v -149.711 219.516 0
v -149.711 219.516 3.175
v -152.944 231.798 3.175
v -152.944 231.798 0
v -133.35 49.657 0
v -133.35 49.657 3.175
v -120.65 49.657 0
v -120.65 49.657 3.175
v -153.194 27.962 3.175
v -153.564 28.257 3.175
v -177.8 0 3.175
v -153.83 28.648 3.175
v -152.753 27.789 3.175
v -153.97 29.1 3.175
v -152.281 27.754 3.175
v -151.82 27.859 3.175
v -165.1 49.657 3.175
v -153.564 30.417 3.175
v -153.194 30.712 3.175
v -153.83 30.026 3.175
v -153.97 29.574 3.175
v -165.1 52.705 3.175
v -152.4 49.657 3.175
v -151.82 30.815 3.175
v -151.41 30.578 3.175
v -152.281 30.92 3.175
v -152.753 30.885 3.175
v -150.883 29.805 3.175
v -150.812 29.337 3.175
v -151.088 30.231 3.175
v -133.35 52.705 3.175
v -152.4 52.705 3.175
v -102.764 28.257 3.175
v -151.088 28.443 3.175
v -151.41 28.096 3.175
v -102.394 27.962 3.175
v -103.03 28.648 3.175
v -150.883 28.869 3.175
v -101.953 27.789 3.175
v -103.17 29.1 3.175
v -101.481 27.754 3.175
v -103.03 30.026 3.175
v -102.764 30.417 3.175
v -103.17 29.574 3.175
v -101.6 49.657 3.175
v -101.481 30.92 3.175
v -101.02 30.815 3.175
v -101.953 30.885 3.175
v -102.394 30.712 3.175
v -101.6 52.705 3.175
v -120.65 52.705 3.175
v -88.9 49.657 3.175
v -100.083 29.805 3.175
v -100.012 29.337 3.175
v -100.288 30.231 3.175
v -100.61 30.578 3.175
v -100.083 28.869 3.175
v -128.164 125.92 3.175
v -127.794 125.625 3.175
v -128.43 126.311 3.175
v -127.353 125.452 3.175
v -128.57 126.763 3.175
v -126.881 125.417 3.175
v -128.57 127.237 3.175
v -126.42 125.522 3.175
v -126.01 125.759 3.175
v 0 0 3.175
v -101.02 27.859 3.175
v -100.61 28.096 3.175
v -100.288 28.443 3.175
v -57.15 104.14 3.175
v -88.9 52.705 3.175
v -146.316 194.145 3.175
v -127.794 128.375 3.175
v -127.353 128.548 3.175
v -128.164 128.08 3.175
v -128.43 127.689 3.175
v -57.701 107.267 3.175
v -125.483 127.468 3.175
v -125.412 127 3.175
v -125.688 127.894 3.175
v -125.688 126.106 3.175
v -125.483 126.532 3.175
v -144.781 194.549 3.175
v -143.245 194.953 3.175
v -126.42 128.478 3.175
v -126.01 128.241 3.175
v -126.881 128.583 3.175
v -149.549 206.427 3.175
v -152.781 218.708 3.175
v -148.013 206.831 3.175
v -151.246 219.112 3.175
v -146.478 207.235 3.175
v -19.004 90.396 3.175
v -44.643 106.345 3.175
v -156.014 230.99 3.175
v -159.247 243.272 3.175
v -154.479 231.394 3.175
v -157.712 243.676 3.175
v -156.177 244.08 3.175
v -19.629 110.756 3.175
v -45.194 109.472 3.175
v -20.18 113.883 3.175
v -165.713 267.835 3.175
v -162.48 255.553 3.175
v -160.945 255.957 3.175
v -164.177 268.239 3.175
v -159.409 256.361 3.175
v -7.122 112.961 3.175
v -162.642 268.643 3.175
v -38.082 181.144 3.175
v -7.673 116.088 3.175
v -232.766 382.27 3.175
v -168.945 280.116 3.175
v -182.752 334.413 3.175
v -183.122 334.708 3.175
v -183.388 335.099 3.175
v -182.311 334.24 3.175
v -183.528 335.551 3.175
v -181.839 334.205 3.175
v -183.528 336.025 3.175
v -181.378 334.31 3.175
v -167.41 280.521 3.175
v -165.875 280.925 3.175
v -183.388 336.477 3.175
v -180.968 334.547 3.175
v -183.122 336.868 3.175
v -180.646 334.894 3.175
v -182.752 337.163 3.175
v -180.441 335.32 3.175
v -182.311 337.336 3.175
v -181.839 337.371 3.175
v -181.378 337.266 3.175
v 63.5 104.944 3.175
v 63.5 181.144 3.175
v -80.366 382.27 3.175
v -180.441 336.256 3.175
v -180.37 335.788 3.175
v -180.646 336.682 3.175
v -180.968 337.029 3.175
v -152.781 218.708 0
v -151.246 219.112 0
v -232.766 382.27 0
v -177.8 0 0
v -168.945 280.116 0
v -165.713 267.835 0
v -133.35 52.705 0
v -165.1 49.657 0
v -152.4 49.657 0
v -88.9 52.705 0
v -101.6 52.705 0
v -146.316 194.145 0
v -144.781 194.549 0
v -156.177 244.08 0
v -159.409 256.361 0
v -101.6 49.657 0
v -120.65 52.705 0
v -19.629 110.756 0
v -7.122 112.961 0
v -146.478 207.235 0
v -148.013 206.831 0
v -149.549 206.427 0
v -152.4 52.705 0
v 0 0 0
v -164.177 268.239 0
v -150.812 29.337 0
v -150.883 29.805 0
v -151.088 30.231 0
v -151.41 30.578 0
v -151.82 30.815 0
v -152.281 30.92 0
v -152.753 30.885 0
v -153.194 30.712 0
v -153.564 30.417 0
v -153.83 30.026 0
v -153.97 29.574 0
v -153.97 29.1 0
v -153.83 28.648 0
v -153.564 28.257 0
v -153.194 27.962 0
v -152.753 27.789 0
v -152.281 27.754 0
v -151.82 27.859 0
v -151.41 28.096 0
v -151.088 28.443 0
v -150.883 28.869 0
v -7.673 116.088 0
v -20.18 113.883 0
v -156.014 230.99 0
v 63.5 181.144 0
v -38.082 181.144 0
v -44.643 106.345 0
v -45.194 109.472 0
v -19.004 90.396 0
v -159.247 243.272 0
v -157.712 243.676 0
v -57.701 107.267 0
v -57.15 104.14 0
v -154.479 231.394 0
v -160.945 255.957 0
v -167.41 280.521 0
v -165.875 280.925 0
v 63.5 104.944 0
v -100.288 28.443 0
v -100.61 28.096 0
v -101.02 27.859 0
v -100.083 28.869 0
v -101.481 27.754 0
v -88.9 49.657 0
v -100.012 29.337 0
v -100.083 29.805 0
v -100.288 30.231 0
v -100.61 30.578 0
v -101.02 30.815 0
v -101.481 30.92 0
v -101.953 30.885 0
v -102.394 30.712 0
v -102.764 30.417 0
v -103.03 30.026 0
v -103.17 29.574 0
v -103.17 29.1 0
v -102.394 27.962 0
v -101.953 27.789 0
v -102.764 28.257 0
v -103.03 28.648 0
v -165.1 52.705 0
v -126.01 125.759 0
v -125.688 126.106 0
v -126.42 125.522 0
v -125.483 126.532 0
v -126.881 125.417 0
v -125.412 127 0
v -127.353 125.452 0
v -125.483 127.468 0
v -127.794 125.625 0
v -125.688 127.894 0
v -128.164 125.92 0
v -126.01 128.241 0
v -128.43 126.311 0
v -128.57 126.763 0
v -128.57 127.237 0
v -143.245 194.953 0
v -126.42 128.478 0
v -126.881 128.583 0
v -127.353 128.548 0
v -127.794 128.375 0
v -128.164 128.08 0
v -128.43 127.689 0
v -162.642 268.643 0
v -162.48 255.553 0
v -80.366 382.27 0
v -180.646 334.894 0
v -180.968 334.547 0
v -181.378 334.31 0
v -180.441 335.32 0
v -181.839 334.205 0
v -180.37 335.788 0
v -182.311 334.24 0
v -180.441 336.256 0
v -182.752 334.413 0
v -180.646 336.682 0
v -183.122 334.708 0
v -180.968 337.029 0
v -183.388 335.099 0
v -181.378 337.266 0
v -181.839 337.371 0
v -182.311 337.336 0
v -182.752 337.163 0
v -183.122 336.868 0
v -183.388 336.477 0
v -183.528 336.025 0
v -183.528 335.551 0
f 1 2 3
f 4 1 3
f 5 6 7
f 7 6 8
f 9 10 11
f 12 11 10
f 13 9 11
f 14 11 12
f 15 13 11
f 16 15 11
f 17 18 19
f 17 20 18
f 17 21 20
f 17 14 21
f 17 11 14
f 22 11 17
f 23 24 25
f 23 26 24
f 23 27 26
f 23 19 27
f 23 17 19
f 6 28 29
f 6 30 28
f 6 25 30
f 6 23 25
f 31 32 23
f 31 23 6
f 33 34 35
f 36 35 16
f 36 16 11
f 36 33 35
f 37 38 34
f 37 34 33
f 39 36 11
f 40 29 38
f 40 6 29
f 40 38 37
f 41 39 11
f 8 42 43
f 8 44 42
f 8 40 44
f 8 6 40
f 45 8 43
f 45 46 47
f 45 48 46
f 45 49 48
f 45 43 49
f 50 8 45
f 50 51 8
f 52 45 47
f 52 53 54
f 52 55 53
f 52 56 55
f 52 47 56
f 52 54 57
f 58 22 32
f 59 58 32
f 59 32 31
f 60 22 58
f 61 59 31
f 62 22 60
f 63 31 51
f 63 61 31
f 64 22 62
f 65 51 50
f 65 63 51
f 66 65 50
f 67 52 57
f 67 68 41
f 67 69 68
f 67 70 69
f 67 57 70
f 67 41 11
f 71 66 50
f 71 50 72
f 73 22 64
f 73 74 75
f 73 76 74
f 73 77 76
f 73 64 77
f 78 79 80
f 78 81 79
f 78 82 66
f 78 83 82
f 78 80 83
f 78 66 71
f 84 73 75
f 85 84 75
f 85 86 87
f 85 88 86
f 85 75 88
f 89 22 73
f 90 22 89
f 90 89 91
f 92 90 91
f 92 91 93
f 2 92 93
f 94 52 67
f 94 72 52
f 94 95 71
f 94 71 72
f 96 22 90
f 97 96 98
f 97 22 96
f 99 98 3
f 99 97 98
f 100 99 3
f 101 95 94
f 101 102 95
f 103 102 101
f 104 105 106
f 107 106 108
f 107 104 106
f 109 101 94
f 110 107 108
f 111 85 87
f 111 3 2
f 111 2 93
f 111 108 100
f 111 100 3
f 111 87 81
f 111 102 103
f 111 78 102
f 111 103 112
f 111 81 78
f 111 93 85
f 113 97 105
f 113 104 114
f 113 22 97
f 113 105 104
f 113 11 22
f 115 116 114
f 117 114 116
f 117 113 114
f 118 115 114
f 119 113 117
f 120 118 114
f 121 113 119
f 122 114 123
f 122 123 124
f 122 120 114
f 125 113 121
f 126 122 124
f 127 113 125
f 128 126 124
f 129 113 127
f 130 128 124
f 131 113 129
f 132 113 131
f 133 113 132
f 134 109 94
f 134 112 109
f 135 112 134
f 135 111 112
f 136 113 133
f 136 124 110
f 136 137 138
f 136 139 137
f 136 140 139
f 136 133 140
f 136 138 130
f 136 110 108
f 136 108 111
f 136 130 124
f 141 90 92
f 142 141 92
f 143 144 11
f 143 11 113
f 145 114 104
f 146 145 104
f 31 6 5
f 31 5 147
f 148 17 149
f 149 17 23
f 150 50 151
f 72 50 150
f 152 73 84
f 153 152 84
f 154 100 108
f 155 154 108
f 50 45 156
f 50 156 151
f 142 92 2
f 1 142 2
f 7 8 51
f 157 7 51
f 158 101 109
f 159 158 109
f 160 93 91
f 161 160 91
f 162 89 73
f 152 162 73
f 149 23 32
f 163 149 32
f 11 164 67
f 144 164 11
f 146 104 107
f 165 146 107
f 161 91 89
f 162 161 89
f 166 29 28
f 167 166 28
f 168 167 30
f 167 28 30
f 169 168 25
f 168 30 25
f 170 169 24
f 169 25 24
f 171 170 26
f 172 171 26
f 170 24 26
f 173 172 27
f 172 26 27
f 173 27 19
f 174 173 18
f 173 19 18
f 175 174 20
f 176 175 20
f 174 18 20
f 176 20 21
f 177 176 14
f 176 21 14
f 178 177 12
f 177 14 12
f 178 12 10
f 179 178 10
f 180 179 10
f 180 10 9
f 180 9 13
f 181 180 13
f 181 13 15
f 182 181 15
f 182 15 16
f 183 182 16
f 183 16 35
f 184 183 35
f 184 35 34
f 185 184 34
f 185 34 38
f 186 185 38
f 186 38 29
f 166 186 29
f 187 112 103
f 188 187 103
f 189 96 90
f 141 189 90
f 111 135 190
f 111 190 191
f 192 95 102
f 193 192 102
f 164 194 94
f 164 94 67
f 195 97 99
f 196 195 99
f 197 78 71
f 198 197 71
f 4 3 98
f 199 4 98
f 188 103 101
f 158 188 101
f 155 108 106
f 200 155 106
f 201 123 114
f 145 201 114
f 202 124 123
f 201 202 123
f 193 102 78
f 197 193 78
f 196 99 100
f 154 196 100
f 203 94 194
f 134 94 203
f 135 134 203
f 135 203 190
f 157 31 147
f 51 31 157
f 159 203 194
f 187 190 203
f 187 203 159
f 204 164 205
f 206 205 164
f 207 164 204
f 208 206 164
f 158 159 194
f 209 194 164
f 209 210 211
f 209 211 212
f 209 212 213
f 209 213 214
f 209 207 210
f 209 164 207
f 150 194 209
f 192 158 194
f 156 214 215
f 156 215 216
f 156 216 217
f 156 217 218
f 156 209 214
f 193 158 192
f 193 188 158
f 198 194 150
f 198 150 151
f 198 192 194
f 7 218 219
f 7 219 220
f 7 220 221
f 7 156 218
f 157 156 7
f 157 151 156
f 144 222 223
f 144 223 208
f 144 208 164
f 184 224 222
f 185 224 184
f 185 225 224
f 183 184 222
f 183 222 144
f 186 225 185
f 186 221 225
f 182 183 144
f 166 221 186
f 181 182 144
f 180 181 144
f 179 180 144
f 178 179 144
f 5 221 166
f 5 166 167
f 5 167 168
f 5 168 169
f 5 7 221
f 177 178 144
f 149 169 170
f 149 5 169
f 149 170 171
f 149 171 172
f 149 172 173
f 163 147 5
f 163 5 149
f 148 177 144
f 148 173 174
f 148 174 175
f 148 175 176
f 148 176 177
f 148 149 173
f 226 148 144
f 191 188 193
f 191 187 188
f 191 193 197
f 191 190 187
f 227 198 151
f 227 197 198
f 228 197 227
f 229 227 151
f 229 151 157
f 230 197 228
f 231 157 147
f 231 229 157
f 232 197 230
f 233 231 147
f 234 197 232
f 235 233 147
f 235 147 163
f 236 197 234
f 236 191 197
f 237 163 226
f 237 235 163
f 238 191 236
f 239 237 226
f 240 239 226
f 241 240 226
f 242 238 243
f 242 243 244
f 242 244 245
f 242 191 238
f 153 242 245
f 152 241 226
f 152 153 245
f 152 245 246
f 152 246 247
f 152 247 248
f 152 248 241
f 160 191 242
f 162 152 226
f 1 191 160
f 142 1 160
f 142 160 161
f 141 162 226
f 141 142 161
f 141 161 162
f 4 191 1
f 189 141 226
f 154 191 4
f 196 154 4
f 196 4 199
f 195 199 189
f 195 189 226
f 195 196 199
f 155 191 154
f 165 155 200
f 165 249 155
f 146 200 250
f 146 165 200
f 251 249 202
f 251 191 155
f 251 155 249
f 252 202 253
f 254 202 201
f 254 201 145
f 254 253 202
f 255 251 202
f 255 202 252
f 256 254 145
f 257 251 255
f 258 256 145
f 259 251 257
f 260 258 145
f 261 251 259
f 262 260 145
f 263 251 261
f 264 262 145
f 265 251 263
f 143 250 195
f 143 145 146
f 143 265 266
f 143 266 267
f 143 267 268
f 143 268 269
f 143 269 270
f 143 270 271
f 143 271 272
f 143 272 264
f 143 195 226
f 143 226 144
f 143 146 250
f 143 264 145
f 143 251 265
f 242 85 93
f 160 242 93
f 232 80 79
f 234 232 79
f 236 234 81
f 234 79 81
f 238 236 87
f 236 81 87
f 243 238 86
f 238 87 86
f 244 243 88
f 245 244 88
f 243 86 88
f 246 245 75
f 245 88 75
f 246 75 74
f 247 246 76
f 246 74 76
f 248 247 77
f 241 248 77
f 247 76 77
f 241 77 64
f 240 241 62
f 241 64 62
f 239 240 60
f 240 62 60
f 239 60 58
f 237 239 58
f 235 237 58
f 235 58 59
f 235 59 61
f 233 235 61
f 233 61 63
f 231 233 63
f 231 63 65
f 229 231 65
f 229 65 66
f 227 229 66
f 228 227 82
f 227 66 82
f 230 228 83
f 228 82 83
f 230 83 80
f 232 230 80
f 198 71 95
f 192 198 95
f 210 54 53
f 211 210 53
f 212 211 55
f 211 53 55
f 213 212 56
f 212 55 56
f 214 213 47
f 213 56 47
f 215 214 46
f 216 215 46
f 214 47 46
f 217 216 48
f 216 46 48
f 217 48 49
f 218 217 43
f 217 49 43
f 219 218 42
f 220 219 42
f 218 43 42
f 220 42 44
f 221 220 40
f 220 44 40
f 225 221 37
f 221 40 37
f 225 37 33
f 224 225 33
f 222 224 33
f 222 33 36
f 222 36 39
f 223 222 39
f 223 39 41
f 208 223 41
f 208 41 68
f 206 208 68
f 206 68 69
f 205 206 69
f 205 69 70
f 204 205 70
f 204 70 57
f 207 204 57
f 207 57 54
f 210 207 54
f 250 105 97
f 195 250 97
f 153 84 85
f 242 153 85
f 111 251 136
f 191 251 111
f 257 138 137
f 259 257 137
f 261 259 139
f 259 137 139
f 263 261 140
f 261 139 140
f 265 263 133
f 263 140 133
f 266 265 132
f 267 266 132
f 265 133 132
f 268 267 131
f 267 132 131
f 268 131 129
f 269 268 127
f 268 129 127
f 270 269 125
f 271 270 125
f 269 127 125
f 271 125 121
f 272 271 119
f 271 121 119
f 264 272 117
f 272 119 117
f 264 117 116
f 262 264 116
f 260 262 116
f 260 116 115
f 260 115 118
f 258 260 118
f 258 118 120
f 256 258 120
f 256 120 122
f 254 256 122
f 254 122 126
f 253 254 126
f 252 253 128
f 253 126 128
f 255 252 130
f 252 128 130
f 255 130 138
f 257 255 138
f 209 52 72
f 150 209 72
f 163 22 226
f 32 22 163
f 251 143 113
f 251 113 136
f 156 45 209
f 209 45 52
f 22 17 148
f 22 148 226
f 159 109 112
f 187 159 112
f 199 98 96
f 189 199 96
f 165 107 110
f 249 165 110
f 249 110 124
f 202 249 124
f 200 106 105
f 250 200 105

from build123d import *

# Parameters (mm, degrees)
BOSS_EXTRUDE1_DEPTH = 3.175
SKETCH2_R           = 1.5875
CUT_EXTRUDE1_DEPTH  = 3.175
BOSS_EXTRUDE2_DEPTH = 3.175
CUT_EXTRUDE2_DEPTH  = 3.175
CUT_EXTRUDE3_DEPTH  = 10.16
LPATTERN1_COUNT     = 4
LPATTERN1_PITCH     = 25.4
SKETCH6_W           = 12.7
SKETCH6_H           = 3.048
CUT_EXTRUDE4_DEPTH  = 5.08
LPATTERN2_COUNT     = 3
LPATTERN2_PITCH     = 31.75
SKETCH7_R           = 1.5875
CUT_EXTRUDE5_DEPTH  = 19.05


with BuildPart() as part:
    # Sketch1 → Boss-Extrude1 (new body)
    with BuildSketch(Plane.XY):
        Polygon((0, 0), (-177.8, 0), (-232.7656, 382.27), (-80.3656, 382.27), align=None)
    extrude(amount=BOSS_EXTRUDE1_DEPTH)

    # Sketch2 → Cut-Extrude1 (cut)
    with BuildSketch(Plane.XY.offset(3.175)):
        with Locations((-127, 127)):
            Circle(SKETCH2_R)
        with Locations((-181.95798, 335.788)):
            Circle(SKETCH2_R)
    extrude(amount=-CUT_EXTRUDE1_DEPTH, mode=Mode.SUBTRACT)

    # Sketch3 → Boss-Extrude2 (add)
    with BuildSketch(Plane.XY.offset(3.175)):
        Polygon((-63.5, 82.55), (63.5, 104.94352655), (63.5, 181.14352655), (-63.5, 181.14352655), align=None)
    extrude(amount=-BOSS_EXTRUDE2_DEPTH)

    # Sketch4 → Cut-Extrude2 (cut)
    with BuildSketch(Plane.XY.offset(3.175)):
        Polygon((-57.15, 104.14), (-44.642941537, 106.345331856), (-45.194274501, 109.472096472), (-57.701332964, 107.266764616), align=None)
        Polygon((-19.62882461, 110.755995569), (-7.121766147, 112.961327425), (-7.673099111, 116.088092041), (-20.180157574, 113.882760185), align=None)
    extrude(amount=-CUT_EXTRUDE2_DEPTH, mode=Mode.SUBTRACT)

    # Sketch5 → Cut-Extrude3 (cut)
    with BuildSketch(Plane.XY.offset(3.175)):
        Polygon((-148.01334563, 206.830707159), (-144.780523225, 194.549059903), (-143.245317319, 194.953162704), (-146.478139723, 207.234809959), align=None)
        Polygon((-146.315729132, 194.144957103), (-144.780523225, 194.549059903), (-148.01334563, 206.830707159), (-149.548551537, 206.426604358), align=None)
    cut_extrude3 = extrude(amount=-CUT_EXTRUDE3_DEPTH, mode=Mode.SUBTRACT)

    # LPattern1: Cut-Extrude3 ×4
    with Locations(*[Vector(-0.254552945, 0.967058839, 0) * (i * LPATTERN1_PITCH) for i in range(1, LPATTERN1_COUNT)]):
        add(cut_extrude3, mode=Mode.SUBTRACT)

    # Sketch6 → Cut-Extrude4 (cut)
    with BuildSketch(Plane.XY.offset(3.175)):
        with Locations((-158.75, 51.181)):
            Rectangle(SKETCH6_W, SKETCH6_H)
    cut_extrude4 = extrude(amount=-CUT_EXTRUDE4_DEPTH, mode=Mode.SUBTRACT)

    # LPattern2: Cut-Extrude4 ×3
    with Locations(*[(i * LPATTERN2_PITCH, 0, 0) for i in range(1, LPATTERN2_COUNT)]):
        add(cut_extrude4, mode=Mode.SUBTRACT)

    # Sketch7 → Cut-Extrude5 (cut)
    with BuildSketch(Plane.XY.offset(3.175)):
        with Locations((-152.4, 29.337)):
            Circle(SKETCH7_R)
        with Locations((-101.6, 29.337)):
            Circle(SKETCH7_R)
    extrude(amount=-CUT_EXTRUDE5_DEPTH, mode=Mode.SUBTRACT)


solid = part.part
